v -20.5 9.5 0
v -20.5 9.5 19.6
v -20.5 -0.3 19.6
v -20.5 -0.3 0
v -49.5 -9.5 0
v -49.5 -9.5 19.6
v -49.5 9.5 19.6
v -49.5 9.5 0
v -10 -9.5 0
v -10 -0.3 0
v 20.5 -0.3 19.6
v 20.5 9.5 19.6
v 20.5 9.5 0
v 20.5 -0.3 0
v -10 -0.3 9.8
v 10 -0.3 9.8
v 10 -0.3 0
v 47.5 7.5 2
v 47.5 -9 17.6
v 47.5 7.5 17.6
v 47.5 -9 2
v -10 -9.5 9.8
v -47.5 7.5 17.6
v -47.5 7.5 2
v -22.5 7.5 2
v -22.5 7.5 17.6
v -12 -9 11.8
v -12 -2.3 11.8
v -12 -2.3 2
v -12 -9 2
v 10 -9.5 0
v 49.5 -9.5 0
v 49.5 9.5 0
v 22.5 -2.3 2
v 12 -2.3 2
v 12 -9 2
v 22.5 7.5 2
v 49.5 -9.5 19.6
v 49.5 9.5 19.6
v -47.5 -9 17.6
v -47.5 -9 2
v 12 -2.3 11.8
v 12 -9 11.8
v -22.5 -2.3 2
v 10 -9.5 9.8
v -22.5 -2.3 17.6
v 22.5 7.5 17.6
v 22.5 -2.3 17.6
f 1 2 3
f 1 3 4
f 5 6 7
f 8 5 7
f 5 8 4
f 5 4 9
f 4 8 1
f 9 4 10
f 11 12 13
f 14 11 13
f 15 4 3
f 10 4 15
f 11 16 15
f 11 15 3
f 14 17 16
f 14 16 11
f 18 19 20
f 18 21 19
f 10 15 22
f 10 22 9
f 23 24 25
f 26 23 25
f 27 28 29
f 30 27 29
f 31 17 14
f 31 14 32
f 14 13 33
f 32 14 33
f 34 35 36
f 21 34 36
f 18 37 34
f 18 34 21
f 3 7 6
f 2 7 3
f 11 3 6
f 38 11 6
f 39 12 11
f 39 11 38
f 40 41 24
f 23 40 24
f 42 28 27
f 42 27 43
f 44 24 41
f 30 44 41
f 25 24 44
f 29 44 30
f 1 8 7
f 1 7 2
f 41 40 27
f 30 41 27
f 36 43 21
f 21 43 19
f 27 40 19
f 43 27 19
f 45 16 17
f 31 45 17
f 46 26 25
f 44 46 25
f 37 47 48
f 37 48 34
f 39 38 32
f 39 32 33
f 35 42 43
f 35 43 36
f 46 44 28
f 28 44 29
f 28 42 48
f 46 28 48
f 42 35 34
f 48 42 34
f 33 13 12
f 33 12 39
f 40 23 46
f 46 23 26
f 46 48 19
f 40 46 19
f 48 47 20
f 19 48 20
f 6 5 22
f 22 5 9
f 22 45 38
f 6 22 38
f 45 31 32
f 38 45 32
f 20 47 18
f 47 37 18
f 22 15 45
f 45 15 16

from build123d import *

# Parameters (mm, degrees)
SKETCH_1_W          = 99
SKETCH_1_H          = 19
EXTRUDE_1_DEPTH     = 19.6
SKETCH_3_W          = 41
SKETCH_3_H          = 19.6
CUT_EXTRUDE_1_DEPTH = 9.8
SKETCH_6_W          = 20
SKETCH_6_H          = 19.6
CUT_EXTRUDE_2_DEPTH = 15.5
SHELL_2_T           = -2
SKETCH_7_W          = 99
SKETCH_7_H          = 19.6
EXTRUDE_3_DEPTH     = 0.5
SKETCH_21_W         = 20
SKETCH_21_H         = 9.8
CUT_EXTRUDE_3_DEPTH = 6.5


with BuildPart() as part:
    # 草圖1 → 填料-伸長1 (new body)
    with BuildSketch(Plane.XY):
        Rectangle(SKETCH_1_W, SKETCH_1_H)
    extrude(amount=EXTRUDE_1_DEPTH)

    # 草圖3 → 除料-伸長1 (cut)
    with BuildSketch(Plane(origin=(0, 9.5, 0), x_dir=(1, 0, 0), z_dir=(0, 1, 0))):
        with Locations((0, -9.8)):
            Rectangle(SKETCH_3_W, SKETCH_3_H)
    extrude(amount=-CUT_EXTRUDE_1_DEPTH, mode=Mode.SUBTRACT)

    # 草圖6 → 除料-伸長2 (cut)
    with BuildSketch(Plane(origin=(0, -0.3, 0), x_dir=(1, 0, 0), z_dir=(0, 1, 0))):
        Rectangle(SKETCH_6_W, SKETCH_6_H)
    extrude(amount=-CUT_EXTRUDE_2_DEPTH, mode=Mode.SUBTRACT)

    # 薄殼2
    shell_2_openings = [part.faces().sort_by_distance(p)[0] for p in [
        (0, -9.5, 10.350561798),
    ]]
    offset(amount=SHELL_2_T, openings=shell_2_openings, kind=Kind.INTERSECTION)

    # 草圖7 → 填料-伸長3 (add)
    with BuildSketch(Plane.XZ.offset(9.5)):
        with Locations((0, 9.8)):
            Rectangle(SKETCH_7_W, SKETCH_7_H)
    extrude(amount=-EXTRUDE_3_DEPTH)

    # 草圖21 → 除料-伸長3 (cut)
    with BuildSketch(Plane(origin=(0, -9, 0), x_dir=(1, 0, 0), z_dir=(0, 1, 0))):
        with Locations((0, -4.9)):
            Rectangle(SKETCH_21_W, SKETCH_21_H)
    extrude(amount=-CUT_EXTRUDE_3_DEPTH, mode=Mode.SUBTRACT)


solid = part.part
